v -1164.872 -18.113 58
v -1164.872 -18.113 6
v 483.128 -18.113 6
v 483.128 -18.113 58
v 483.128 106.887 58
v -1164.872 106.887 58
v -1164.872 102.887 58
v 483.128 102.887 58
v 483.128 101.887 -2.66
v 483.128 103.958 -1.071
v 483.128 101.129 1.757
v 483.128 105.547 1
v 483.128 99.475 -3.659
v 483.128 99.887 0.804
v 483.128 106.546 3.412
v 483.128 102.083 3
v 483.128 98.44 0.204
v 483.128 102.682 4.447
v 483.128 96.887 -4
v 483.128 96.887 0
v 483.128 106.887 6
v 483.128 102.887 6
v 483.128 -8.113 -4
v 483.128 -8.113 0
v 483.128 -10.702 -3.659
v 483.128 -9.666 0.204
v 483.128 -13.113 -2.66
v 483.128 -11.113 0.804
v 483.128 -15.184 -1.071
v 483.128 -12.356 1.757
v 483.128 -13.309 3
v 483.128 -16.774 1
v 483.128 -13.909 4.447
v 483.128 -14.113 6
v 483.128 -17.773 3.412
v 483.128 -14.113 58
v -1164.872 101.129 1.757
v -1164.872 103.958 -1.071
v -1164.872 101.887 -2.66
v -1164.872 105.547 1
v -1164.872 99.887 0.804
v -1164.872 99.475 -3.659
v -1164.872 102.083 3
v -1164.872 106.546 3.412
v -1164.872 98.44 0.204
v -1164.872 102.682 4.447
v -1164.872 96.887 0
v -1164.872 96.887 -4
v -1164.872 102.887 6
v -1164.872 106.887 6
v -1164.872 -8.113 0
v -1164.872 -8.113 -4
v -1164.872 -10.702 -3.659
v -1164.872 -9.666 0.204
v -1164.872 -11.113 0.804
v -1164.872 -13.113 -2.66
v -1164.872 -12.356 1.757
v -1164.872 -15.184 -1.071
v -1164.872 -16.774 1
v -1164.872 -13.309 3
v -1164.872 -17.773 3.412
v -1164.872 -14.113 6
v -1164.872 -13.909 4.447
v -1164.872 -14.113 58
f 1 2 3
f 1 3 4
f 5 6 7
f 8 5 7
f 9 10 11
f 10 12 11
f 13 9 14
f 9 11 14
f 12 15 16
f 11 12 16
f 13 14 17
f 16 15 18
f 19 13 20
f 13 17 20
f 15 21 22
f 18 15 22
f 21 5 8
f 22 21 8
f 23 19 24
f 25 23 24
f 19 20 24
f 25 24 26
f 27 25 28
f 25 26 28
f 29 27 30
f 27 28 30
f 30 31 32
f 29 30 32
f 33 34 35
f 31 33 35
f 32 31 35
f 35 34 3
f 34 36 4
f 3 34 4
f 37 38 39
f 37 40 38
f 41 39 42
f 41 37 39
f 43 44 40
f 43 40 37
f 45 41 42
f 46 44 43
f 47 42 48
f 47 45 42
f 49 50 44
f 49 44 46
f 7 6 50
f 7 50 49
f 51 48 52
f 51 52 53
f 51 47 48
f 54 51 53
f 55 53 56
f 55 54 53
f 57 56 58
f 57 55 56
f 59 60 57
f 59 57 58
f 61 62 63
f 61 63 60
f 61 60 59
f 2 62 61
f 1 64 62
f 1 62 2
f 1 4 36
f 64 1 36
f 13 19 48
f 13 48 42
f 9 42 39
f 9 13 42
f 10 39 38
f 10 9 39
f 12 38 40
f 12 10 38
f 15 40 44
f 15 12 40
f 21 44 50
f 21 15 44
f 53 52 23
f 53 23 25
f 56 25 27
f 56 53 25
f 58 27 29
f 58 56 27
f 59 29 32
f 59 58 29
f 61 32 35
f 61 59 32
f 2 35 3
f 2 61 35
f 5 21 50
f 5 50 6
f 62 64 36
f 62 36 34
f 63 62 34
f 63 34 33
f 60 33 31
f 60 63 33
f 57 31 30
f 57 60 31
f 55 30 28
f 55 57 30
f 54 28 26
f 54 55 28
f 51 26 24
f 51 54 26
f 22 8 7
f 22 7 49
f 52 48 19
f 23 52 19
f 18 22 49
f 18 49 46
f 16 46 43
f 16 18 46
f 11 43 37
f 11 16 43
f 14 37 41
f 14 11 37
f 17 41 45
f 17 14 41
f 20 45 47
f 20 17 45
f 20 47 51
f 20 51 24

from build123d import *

# Parameters (mm, degrees)
SKETCH1_W                    = 1648
SKETCH1_H                    = 125
BASE_FLANGE1_DEPTH           = 4
EDGE_FLANGE1_STRIP_W         = 28
EDGE_FLANGE1_STRIP_H         = 4
EDGE_FLANGE1_STRIP_CUT_DEPTH = 1648
EDGE_FLANGE1_DEPTH           = 1648
EDGE_FLANGE2_STRIP_W         = 28
EDGE_FLANGE2_STRIP_H         = 4
EDGE_FLANGE2_STRIP_CUT_DEPTH = 1648
EDGE_FLANGE2_DEPTH           = 1648


# Sheet-metal steps are written as plain solids
with BuildPart() as part:
    # Sketch1 → Base-Flange1 (new body)
    with BuildSketch(Plane.XY):
        with Locations((-340.8723099, 44.386657102)):
            Rectangle(SKETCH1_W, SKETCH1_H)
    extrude(amount=-BASE_FLANGE1_DEPTH)

    # Edge-Flange1 strip (across the edge) → Edge-Flange1 strip cut (cut)
    with BuildSketch(Plane(origin=(483.1276901, 106.886657102, 0), x_dir=(0, -1, 0), z_dir=(-1, 0, 0))):
        with Locations((-4, -2)):
            Rectangle(EDGE_FLANGE1_STRIP_W, EDGE_FLANGE1_STRIP_H)
    extrude(amount=EDGE_FLANGE1_STRIP_CUT_DEPTH, mode=Mode.SUBTRACT)

    # Edge-Flange1 section (across the edge) → Edge-Flange1 (add)
    with BuildSketch(Plane(origin=(483.1276901, 106.886657102, 0), x_dir=(0, -1, 0), z_dir=(-1, 0, 0))):
        with BuildLine():
            Line((0, 6), (0, 58))
            Line((0, 58), (4, 58))
            Line((4, 58), (4, 6))
            ThreePointArc((4, 6), (5.757359313, 1.757359313), (10, 0))
            Line((10, 0), (10, -4))
            ThreePointArc((10, -4), (2.928932188, -1.071067812), (0, 6))
        make_face()
    extrude(amount=EDGE_FLANGE1_DEPTH)

    # Edge-Flange2 strip (across the edge) → Edge-Flange2 strip cut (cut)
    with BuildSketch(Plane(origin=(-1164.8723099, -18.113342898, 0), x_dir=(0, 1, 0), z_dir=(1, 0, 0))):
        with Locations((-4, -2)):
            Rectangle(EDGE_FLANGE2_STRIP_W, EDGE_FLANGE2_STRIP_H)
    extrude(amount=EDGE_FLANGE2_STRIP_CUT_DEPTH, mode=Mode.SUBTRACT)

    # Edge-Flange2 section (across the edge) → Edge-Flange2 (add)
    with BuildSketch(Plane(origin=(-1164.8723099, -18.113342898, 0), x_dir=(0, 1, 0), z_dir=(1, 0, 0))):
        with BuildLine():
            Line((0, 6), (0, 58))
            Line((0, 58), (4, 58))
            Line((4, 58), (4, 6))
            ThreePointArc((4, 6), (5.757359313, 1.757359313), (10, 0))
            Line((10, 0), (10, -4))
            ThreePointArc((10, -4), (2.928932188, -1.071067812), (0, 6))
        make_face()
    extrude(amount=EDGE_FLANGE2_DEPTH)


solid = part.part
